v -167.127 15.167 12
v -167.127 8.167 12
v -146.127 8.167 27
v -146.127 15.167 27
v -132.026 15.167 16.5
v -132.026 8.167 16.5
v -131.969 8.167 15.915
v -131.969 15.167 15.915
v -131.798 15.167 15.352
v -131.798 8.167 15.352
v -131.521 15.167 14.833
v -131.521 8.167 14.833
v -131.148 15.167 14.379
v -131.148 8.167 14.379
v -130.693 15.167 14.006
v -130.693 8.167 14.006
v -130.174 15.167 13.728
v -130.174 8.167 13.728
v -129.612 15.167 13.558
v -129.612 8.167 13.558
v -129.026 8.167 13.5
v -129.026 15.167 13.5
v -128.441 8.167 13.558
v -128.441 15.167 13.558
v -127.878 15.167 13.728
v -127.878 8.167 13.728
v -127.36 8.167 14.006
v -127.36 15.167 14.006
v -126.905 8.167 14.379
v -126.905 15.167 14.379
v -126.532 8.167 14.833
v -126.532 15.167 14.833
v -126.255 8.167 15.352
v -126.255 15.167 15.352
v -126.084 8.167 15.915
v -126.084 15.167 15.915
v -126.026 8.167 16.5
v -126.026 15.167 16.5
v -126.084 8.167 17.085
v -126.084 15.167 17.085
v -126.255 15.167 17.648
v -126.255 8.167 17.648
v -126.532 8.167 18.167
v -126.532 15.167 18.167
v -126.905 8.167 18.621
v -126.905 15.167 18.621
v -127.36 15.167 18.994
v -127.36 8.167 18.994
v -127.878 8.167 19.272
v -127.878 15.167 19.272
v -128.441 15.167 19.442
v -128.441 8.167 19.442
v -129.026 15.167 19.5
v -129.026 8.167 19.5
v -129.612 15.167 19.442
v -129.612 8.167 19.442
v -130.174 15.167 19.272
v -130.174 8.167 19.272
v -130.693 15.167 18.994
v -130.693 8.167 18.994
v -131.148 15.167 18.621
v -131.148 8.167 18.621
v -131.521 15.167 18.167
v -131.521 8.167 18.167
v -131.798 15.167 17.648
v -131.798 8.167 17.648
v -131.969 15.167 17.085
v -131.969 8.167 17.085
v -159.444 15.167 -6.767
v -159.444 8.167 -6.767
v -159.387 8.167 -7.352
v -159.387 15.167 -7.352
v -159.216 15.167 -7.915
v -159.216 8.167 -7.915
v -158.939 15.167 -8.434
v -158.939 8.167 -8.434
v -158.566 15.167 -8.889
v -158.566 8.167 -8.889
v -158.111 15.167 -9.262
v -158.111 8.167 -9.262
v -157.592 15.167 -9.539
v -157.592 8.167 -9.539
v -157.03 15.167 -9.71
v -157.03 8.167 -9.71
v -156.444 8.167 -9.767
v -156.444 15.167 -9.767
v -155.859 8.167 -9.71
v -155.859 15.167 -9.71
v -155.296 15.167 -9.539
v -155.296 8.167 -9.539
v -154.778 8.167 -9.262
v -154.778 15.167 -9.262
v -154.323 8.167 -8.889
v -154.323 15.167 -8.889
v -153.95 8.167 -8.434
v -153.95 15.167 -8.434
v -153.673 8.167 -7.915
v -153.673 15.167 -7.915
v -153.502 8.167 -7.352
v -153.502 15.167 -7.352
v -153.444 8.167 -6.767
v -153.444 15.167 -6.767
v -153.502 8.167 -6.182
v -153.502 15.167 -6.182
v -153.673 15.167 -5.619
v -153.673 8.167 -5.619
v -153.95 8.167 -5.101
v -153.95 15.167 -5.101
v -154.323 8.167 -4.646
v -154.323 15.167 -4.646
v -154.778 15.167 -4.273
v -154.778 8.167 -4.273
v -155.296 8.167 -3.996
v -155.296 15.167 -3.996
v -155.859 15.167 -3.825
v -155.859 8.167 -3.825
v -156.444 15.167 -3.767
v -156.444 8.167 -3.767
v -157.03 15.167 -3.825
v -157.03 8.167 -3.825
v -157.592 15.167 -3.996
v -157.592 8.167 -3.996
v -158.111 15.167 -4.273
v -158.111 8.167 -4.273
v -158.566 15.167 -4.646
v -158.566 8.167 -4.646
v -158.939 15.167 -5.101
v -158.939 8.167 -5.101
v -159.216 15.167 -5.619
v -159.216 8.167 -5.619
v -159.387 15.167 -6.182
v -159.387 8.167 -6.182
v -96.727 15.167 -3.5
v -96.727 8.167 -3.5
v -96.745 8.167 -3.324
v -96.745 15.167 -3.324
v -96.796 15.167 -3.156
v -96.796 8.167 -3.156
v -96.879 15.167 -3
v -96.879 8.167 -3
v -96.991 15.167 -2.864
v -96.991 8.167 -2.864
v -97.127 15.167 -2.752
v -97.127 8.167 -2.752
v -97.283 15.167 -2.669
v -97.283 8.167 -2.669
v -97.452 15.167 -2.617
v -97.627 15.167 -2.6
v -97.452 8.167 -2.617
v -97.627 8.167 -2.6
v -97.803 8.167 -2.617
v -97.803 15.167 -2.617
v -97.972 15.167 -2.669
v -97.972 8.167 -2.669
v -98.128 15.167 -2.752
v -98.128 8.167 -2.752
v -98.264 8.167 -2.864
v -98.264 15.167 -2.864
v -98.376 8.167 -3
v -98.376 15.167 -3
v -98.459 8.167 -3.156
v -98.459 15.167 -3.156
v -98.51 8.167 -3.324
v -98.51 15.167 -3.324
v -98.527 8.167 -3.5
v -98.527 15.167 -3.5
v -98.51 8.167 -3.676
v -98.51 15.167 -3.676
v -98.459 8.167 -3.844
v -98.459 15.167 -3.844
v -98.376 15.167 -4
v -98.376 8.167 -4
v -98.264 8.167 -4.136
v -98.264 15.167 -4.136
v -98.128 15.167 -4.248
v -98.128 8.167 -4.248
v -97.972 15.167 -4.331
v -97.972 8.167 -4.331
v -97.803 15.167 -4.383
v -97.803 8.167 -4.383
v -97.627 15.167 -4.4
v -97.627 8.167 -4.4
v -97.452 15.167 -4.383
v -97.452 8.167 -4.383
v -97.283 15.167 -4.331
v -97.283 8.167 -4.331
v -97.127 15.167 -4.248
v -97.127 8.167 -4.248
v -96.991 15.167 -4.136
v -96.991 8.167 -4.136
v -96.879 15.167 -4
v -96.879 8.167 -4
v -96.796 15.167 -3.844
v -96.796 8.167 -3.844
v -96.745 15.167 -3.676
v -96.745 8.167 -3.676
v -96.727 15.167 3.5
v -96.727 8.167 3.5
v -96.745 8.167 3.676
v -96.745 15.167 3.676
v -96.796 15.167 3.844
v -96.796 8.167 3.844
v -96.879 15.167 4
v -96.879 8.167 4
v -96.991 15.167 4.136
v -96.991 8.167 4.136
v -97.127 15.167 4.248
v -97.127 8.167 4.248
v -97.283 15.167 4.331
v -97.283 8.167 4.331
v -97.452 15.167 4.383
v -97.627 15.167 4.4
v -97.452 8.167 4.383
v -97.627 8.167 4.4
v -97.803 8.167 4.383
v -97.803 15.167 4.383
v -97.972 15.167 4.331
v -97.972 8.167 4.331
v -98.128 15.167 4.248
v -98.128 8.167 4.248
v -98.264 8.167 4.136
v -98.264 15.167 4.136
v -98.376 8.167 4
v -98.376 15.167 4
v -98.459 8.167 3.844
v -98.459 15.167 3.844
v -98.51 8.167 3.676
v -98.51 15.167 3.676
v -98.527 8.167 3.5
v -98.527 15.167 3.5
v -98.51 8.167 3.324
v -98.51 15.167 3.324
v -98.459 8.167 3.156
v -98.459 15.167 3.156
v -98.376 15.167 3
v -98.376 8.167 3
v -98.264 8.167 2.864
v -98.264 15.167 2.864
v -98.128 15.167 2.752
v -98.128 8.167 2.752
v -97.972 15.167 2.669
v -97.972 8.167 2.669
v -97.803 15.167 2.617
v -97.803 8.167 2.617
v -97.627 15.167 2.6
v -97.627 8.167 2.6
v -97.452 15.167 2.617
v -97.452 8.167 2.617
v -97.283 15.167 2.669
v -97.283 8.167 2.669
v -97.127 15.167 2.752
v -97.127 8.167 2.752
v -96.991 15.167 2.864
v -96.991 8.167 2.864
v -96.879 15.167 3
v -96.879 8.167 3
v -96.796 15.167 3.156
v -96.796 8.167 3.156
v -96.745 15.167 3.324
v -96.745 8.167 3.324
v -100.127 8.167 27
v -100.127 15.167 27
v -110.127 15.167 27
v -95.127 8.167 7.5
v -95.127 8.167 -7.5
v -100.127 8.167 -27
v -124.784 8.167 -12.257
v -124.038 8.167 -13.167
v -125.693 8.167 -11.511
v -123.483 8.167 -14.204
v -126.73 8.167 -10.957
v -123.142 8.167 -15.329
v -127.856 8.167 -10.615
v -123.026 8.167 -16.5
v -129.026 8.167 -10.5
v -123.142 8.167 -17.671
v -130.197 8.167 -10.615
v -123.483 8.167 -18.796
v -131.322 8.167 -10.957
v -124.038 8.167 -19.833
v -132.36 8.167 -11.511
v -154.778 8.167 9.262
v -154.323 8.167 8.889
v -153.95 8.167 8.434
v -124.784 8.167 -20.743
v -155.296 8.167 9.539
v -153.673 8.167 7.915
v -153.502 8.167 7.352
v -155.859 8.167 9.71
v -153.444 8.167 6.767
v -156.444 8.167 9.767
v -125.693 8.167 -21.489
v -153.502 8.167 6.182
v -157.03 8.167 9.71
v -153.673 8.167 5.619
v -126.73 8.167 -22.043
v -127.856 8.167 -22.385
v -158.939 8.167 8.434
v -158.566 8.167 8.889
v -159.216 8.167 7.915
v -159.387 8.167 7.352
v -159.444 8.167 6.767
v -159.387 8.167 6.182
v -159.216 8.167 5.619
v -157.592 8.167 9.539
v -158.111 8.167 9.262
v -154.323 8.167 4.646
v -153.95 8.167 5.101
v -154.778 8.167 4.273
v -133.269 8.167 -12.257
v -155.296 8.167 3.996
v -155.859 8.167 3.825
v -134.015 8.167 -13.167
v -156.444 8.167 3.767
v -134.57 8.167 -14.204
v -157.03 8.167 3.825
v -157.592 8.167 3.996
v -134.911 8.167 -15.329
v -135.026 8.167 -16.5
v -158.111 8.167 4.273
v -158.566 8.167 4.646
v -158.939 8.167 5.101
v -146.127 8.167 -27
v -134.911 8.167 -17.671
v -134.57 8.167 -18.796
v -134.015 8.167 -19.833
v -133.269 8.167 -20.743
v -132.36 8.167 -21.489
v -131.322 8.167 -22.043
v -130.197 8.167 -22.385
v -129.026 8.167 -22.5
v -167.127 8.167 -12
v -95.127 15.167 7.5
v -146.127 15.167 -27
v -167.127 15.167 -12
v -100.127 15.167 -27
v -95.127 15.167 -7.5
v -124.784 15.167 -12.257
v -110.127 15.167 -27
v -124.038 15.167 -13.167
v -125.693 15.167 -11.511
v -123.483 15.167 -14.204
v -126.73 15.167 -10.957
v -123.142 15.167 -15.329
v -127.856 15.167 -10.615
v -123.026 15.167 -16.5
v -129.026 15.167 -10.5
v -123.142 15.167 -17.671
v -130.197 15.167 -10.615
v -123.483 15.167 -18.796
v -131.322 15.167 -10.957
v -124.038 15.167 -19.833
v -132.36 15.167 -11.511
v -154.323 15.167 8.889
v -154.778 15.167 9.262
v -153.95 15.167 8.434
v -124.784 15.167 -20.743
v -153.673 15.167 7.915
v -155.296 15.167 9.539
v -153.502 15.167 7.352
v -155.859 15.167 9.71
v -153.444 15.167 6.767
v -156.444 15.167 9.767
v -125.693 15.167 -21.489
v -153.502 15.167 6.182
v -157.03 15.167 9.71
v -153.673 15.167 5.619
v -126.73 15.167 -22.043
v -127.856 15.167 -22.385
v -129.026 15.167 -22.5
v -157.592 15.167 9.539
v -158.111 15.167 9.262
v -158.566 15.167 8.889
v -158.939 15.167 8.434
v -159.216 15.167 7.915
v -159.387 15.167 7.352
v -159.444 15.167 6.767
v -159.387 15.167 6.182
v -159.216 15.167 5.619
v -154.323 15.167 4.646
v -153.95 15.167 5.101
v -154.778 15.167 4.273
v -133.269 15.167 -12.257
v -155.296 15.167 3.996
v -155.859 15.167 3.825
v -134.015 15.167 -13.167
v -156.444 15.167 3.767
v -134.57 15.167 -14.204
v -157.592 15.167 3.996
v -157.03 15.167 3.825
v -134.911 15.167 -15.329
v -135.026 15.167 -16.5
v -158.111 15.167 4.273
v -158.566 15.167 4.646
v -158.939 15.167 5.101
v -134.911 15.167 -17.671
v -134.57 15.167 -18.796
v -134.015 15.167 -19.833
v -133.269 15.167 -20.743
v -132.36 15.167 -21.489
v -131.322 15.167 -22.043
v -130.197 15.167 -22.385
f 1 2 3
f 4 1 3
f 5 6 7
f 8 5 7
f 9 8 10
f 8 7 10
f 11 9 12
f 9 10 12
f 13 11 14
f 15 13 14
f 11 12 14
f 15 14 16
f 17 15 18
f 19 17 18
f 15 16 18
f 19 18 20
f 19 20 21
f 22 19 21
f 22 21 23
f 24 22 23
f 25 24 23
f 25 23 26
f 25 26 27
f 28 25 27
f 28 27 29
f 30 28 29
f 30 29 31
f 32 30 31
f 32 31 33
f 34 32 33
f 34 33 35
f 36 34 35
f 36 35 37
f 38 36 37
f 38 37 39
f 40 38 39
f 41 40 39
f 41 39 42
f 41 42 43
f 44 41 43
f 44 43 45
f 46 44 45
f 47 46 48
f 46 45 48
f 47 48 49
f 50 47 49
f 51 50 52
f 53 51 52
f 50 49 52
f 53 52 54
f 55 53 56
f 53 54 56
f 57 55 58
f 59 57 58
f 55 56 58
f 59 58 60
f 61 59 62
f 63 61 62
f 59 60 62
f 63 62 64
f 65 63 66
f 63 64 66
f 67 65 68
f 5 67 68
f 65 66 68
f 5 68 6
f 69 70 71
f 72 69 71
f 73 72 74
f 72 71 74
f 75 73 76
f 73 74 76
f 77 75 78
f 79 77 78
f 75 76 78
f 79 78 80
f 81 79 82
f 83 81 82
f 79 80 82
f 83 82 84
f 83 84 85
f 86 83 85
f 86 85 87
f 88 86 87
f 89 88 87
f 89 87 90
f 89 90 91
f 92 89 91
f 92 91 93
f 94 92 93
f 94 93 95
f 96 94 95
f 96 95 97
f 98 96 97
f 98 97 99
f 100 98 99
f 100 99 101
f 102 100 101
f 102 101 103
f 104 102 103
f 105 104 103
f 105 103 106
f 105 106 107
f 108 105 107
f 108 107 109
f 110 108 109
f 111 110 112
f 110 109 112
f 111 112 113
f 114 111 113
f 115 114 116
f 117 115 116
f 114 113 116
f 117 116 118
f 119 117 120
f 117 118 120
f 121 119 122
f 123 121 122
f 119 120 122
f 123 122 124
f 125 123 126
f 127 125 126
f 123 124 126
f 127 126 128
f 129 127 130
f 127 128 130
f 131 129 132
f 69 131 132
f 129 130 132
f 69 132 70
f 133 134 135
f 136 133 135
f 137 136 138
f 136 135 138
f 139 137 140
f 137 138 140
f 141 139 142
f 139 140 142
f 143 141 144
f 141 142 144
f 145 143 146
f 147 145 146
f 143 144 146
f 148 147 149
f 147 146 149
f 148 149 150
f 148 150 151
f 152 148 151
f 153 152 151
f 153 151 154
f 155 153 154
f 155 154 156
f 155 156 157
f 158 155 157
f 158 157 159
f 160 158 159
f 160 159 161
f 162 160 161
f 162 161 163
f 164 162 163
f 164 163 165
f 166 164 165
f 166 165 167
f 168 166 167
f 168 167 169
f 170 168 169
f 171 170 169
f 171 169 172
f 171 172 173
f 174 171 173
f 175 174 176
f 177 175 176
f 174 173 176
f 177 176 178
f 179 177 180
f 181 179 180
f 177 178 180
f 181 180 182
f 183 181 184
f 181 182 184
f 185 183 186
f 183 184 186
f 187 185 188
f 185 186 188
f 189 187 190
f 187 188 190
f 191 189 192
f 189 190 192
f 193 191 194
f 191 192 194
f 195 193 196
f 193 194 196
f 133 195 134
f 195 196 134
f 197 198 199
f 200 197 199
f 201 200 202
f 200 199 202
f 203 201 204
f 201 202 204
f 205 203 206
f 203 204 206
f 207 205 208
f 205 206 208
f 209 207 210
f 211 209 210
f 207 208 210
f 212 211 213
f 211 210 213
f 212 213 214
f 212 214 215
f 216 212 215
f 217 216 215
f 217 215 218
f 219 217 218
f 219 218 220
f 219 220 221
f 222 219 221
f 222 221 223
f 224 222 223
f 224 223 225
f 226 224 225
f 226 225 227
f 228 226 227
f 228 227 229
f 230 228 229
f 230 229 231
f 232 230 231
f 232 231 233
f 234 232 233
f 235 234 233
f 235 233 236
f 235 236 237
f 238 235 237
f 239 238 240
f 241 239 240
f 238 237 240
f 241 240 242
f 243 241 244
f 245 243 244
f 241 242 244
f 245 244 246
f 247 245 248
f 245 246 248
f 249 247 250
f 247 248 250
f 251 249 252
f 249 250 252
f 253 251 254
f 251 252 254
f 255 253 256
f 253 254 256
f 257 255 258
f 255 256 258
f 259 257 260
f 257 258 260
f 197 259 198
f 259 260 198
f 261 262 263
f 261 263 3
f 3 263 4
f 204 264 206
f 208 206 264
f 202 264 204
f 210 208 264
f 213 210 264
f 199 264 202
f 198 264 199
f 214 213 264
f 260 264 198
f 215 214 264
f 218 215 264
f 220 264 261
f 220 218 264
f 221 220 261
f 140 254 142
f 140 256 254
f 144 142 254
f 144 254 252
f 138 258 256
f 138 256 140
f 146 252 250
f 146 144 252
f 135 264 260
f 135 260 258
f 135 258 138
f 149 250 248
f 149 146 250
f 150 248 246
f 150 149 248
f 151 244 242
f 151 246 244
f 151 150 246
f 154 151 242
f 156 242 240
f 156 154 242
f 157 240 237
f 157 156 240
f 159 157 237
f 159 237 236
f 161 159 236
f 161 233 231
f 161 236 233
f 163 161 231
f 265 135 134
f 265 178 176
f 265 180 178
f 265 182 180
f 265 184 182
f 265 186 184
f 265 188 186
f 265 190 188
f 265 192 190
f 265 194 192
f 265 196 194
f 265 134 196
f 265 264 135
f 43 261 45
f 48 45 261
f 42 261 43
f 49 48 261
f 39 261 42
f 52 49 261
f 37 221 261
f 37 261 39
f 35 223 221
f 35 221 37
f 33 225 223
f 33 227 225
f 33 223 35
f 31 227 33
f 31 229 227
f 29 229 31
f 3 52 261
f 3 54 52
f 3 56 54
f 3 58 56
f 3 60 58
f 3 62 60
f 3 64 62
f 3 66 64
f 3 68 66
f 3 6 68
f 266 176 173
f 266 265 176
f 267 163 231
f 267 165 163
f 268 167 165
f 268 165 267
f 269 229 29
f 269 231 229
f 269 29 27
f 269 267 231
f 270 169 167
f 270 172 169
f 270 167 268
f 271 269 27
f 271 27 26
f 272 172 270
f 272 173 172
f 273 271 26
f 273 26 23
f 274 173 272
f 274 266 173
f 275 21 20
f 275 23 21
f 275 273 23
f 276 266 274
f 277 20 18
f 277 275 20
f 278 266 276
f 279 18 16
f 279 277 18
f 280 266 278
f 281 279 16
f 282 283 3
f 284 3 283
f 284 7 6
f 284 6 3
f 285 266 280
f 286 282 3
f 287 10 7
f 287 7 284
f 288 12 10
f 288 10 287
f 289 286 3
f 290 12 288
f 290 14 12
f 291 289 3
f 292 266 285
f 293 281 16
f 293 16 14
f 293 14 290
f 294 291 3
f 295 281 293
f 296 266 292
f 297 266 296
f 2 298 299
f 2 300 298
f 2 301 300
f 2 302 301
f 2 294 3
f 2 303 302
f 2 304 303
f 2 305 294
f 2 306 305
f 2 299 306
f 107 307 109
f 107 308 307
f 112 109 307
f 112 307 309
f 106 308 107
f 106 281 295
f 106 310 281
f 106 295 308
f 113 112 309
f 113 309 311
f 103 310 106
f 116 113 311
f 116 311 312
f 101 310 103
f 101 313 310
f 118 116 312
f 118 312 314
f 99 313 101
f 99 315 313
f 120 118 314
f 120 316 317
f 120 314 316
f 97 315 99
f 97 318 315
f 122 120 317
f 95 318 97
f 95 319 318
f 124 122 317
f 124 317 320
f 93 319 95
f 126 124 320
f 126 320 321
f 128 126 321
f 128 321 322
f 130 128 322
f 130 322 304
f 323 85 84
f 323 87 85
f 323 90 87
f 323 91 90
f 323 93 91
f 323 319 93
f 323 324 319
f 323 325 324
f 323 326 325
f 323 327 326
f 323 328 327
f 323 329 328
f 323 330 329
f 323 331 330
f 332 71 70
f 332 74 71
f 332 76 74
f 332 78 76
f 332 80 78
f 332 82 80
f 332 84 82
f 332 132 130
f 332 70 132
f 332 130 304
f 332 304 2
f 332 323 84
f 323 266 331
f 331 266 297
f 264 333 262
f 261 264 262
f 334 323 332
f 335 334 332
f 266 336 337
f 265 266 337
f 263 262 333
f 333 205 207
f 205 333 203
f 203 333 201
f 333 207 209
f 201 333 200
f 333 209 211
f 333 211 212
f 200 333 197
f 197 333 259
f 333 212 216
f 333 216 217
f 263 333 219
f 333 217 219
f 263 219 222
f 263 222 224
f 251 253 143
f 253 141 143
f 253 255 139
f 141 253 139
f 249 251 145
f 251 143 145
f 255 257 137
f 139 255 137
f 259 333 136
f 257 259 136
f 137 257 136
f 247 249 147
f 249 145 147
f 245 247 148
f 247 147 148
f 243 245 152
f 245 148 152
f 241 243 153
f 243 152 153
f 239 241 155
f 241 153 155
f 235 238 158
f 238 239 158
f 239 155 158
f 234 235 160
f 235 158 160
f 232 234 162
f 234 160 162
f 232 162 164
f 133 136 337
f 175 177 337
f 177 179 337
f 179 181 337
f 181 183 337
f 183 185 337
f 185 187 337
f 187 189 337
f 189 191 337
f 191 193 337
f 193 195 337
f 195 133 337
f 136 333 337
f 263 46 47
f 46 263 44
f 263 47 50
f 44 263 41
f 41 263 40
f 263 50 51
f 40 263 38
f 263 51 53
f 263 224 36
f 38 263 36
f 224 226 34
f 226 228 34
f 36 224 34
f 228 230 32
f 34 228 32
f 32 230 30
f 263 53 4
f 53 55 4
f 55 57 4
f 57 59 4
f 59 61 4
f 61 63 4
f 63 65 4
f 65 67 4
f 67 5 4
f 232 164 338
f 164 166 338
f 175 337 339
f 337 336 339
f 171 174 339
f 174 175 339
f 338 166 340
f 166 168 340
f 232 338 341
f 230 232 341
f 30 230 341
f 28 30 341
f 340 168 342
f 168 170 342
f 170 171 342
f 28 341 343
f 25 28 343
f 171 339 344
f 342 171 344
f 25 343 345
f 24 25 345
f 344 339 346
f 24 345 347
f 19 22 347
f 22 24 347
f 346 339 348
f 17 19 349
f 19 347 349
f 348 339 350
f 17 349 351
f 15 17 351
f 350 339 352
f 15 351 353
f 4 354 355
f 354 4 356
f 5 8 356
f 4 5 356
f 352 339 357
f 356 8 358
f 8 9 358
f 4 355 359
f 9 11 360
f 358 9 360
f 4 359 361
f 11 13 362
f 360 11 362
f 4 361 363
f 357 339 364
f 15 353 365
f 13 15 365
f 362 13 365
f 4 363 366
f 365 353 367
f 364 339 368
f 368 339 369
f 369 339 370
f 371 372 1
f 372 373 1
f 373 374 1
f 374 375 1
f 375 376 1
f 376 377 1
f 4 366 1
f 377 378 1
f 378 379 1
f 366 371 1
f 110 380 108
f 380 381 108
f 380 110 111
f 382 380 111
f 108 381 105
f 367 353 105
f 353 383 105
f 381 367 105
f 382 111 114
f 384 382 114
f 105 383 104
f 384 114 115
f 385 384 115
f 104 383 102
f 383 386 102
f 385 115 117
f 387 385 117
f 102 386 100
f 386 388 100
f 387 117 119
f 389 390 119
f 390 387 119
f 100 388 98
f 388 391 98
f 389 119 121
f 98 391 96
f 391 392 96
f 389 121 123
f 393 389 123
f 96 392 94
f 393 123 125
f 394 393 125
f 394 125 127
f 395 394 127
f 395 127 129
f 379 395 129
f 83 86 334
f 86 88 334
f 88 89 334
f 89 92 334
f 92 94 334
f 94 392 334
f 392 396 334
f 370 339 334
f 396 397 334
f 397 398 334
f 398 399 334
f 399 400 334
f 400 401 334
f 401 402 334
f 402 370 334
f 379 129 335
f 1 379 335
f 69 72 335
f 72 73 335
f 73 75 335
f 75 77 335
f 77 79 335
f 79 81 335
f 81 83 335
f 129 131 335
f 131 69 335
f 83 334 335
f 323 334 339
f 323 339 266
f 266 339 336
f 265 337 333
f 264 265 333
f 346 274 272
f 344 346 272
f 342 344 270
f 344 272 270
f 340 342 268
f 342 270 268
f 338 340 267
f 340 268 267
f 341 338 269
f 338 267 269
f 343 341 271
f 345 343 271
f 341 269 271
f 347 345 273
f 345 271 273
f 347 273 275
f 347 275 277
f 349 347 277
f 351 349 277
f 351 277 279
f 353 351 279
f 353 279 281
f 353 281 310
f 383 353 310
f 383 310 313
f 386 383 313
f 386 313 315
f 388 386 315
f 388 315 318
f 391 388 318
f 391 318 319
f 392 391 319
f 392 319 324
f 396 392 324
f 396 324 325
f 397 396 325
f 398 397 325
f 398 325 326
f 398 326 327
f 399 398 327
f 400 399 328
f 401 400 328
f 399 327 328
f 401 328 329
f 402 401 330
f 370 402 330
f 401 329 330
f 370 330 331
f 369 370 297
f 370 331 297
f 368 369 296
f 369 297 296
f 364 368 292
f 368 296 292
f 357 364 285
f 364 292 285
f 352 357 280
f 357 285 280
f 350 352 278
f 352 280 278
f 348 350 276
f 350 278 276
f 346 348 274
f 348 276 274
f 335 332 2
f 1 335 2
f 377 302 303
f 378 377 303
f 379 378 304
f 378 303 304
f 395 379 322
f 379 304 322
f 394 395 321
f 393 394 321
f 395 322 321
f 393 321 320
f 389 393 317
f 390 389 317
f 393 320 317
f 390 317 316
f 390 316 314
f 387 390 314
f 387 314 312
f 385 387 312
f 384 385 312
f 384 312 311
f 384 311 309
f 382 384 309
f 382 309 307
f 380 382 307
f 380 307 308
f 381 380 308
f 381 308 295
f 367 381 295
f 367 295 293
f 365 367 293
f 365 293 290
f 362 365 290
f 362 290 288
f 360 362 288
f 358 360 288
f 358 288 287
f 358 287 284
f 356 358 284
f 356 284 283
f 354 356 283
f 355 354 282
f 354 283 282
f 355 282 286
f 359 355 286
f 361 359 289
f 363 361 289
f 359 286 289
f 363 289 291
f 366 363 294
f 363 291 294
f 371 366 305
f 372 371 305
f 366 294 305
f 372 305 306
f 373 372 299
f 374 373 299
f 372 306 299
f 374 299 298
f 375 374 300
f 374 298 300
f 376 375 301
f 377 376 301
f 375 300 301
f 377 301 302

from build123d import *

# Parameters (mm, degrees)
BOSS_EXTRUDE1_DEPTH = 23.333333333
F_20_0MM_1_D        = 20
SCALE_1_SCALE       = 0.3
EXTRUDE_1_DEPTH     = 7
SKETCH_3_R          = 0.9
CUT_EXTRUDE_1_DEPTH = 8
SKETCH_4_R          = 6
CUT_EXTRUDE_2_DEPTH = 8


with BuildPart() as part:
    # Sketch2 → Boss-Extrude1 (new body)
    with BuildSketch(Plane(origin=(0, 0, 0), x_dir=(1, 0, 0), z_dir=(0, 1, 0))):
        Polygon((-170, -90), (-50, -90), (-50, 90), (-170, 90), (-240, 40), (-240, -40), align=None)
    extrude(amount=BOSS_EXTRUDE1_DEPTH)

    # Ø20.0mm 맞춤핀 구멍1 (through all)
    with Locations(Plane(origin=(0, 23.333333333, 0), x_dir=(1, 0, 0), z_dir=(0, 1, 0))):
        with Locations((-204.389232105, 22.557395049), (-204.389232105, -22.557395049), (-112.996294866, 55), (-112.996294866, -55)):
            Hole(F_20_0MM_1_D / 2)


with BuildPart() as part_1:
    # 축척1: scaled about (-135.896414653, 11.666666667, 0)
    add(part.part.scale(SCALE_1_SCALE).moved(Location((-95.127490257, 8.166666667, 0))))

    # 스케치1 → 보스-돌출1 (add)
    with BuildSketch(Plane(origin=(0, 15.166666667, 0), x_dir=(1, 0, 0), z_dir=(0, 1, 0))):
        Polygon((-95.127490257, -7.5), (-100.127490257, -27), (-110.127490257, -27), (-110.127490257, 27), (-100.127490257, 27), (-95.127490257, 7.5), align=None)
    extrude(amount=-EXTRUDE_1_DEPTH)

    # 스케치3 → 컷-돌출1 (cut, through all)
    with BuildSketch(Plane.XZ.offset(-8.166666667)):
        with Locations((-97.627490257, 3.5)):
            Circle(SKETCH_3_R)
        with Locations((-97.627490257, -3.5)):
            Circle(SKETCH_3_R)
    extrude(amount=-CUT_EXTRUDE_1_DEPTH, mode=Mode.SUBTRACT)

    # 스케치4 → 컷-돌출2 (cut, through all)
    with BuildSketch(Plane.XZ.offset(-8.166666667)):
        with Locations((-129.026378717, -16.5)):
            Circle(SKETCH_4_R)
    extrude(amount=-CUT_EXTRUDE_2_DEPTH, mode=Mode.SUBTRACT)


solid = part_1.part
